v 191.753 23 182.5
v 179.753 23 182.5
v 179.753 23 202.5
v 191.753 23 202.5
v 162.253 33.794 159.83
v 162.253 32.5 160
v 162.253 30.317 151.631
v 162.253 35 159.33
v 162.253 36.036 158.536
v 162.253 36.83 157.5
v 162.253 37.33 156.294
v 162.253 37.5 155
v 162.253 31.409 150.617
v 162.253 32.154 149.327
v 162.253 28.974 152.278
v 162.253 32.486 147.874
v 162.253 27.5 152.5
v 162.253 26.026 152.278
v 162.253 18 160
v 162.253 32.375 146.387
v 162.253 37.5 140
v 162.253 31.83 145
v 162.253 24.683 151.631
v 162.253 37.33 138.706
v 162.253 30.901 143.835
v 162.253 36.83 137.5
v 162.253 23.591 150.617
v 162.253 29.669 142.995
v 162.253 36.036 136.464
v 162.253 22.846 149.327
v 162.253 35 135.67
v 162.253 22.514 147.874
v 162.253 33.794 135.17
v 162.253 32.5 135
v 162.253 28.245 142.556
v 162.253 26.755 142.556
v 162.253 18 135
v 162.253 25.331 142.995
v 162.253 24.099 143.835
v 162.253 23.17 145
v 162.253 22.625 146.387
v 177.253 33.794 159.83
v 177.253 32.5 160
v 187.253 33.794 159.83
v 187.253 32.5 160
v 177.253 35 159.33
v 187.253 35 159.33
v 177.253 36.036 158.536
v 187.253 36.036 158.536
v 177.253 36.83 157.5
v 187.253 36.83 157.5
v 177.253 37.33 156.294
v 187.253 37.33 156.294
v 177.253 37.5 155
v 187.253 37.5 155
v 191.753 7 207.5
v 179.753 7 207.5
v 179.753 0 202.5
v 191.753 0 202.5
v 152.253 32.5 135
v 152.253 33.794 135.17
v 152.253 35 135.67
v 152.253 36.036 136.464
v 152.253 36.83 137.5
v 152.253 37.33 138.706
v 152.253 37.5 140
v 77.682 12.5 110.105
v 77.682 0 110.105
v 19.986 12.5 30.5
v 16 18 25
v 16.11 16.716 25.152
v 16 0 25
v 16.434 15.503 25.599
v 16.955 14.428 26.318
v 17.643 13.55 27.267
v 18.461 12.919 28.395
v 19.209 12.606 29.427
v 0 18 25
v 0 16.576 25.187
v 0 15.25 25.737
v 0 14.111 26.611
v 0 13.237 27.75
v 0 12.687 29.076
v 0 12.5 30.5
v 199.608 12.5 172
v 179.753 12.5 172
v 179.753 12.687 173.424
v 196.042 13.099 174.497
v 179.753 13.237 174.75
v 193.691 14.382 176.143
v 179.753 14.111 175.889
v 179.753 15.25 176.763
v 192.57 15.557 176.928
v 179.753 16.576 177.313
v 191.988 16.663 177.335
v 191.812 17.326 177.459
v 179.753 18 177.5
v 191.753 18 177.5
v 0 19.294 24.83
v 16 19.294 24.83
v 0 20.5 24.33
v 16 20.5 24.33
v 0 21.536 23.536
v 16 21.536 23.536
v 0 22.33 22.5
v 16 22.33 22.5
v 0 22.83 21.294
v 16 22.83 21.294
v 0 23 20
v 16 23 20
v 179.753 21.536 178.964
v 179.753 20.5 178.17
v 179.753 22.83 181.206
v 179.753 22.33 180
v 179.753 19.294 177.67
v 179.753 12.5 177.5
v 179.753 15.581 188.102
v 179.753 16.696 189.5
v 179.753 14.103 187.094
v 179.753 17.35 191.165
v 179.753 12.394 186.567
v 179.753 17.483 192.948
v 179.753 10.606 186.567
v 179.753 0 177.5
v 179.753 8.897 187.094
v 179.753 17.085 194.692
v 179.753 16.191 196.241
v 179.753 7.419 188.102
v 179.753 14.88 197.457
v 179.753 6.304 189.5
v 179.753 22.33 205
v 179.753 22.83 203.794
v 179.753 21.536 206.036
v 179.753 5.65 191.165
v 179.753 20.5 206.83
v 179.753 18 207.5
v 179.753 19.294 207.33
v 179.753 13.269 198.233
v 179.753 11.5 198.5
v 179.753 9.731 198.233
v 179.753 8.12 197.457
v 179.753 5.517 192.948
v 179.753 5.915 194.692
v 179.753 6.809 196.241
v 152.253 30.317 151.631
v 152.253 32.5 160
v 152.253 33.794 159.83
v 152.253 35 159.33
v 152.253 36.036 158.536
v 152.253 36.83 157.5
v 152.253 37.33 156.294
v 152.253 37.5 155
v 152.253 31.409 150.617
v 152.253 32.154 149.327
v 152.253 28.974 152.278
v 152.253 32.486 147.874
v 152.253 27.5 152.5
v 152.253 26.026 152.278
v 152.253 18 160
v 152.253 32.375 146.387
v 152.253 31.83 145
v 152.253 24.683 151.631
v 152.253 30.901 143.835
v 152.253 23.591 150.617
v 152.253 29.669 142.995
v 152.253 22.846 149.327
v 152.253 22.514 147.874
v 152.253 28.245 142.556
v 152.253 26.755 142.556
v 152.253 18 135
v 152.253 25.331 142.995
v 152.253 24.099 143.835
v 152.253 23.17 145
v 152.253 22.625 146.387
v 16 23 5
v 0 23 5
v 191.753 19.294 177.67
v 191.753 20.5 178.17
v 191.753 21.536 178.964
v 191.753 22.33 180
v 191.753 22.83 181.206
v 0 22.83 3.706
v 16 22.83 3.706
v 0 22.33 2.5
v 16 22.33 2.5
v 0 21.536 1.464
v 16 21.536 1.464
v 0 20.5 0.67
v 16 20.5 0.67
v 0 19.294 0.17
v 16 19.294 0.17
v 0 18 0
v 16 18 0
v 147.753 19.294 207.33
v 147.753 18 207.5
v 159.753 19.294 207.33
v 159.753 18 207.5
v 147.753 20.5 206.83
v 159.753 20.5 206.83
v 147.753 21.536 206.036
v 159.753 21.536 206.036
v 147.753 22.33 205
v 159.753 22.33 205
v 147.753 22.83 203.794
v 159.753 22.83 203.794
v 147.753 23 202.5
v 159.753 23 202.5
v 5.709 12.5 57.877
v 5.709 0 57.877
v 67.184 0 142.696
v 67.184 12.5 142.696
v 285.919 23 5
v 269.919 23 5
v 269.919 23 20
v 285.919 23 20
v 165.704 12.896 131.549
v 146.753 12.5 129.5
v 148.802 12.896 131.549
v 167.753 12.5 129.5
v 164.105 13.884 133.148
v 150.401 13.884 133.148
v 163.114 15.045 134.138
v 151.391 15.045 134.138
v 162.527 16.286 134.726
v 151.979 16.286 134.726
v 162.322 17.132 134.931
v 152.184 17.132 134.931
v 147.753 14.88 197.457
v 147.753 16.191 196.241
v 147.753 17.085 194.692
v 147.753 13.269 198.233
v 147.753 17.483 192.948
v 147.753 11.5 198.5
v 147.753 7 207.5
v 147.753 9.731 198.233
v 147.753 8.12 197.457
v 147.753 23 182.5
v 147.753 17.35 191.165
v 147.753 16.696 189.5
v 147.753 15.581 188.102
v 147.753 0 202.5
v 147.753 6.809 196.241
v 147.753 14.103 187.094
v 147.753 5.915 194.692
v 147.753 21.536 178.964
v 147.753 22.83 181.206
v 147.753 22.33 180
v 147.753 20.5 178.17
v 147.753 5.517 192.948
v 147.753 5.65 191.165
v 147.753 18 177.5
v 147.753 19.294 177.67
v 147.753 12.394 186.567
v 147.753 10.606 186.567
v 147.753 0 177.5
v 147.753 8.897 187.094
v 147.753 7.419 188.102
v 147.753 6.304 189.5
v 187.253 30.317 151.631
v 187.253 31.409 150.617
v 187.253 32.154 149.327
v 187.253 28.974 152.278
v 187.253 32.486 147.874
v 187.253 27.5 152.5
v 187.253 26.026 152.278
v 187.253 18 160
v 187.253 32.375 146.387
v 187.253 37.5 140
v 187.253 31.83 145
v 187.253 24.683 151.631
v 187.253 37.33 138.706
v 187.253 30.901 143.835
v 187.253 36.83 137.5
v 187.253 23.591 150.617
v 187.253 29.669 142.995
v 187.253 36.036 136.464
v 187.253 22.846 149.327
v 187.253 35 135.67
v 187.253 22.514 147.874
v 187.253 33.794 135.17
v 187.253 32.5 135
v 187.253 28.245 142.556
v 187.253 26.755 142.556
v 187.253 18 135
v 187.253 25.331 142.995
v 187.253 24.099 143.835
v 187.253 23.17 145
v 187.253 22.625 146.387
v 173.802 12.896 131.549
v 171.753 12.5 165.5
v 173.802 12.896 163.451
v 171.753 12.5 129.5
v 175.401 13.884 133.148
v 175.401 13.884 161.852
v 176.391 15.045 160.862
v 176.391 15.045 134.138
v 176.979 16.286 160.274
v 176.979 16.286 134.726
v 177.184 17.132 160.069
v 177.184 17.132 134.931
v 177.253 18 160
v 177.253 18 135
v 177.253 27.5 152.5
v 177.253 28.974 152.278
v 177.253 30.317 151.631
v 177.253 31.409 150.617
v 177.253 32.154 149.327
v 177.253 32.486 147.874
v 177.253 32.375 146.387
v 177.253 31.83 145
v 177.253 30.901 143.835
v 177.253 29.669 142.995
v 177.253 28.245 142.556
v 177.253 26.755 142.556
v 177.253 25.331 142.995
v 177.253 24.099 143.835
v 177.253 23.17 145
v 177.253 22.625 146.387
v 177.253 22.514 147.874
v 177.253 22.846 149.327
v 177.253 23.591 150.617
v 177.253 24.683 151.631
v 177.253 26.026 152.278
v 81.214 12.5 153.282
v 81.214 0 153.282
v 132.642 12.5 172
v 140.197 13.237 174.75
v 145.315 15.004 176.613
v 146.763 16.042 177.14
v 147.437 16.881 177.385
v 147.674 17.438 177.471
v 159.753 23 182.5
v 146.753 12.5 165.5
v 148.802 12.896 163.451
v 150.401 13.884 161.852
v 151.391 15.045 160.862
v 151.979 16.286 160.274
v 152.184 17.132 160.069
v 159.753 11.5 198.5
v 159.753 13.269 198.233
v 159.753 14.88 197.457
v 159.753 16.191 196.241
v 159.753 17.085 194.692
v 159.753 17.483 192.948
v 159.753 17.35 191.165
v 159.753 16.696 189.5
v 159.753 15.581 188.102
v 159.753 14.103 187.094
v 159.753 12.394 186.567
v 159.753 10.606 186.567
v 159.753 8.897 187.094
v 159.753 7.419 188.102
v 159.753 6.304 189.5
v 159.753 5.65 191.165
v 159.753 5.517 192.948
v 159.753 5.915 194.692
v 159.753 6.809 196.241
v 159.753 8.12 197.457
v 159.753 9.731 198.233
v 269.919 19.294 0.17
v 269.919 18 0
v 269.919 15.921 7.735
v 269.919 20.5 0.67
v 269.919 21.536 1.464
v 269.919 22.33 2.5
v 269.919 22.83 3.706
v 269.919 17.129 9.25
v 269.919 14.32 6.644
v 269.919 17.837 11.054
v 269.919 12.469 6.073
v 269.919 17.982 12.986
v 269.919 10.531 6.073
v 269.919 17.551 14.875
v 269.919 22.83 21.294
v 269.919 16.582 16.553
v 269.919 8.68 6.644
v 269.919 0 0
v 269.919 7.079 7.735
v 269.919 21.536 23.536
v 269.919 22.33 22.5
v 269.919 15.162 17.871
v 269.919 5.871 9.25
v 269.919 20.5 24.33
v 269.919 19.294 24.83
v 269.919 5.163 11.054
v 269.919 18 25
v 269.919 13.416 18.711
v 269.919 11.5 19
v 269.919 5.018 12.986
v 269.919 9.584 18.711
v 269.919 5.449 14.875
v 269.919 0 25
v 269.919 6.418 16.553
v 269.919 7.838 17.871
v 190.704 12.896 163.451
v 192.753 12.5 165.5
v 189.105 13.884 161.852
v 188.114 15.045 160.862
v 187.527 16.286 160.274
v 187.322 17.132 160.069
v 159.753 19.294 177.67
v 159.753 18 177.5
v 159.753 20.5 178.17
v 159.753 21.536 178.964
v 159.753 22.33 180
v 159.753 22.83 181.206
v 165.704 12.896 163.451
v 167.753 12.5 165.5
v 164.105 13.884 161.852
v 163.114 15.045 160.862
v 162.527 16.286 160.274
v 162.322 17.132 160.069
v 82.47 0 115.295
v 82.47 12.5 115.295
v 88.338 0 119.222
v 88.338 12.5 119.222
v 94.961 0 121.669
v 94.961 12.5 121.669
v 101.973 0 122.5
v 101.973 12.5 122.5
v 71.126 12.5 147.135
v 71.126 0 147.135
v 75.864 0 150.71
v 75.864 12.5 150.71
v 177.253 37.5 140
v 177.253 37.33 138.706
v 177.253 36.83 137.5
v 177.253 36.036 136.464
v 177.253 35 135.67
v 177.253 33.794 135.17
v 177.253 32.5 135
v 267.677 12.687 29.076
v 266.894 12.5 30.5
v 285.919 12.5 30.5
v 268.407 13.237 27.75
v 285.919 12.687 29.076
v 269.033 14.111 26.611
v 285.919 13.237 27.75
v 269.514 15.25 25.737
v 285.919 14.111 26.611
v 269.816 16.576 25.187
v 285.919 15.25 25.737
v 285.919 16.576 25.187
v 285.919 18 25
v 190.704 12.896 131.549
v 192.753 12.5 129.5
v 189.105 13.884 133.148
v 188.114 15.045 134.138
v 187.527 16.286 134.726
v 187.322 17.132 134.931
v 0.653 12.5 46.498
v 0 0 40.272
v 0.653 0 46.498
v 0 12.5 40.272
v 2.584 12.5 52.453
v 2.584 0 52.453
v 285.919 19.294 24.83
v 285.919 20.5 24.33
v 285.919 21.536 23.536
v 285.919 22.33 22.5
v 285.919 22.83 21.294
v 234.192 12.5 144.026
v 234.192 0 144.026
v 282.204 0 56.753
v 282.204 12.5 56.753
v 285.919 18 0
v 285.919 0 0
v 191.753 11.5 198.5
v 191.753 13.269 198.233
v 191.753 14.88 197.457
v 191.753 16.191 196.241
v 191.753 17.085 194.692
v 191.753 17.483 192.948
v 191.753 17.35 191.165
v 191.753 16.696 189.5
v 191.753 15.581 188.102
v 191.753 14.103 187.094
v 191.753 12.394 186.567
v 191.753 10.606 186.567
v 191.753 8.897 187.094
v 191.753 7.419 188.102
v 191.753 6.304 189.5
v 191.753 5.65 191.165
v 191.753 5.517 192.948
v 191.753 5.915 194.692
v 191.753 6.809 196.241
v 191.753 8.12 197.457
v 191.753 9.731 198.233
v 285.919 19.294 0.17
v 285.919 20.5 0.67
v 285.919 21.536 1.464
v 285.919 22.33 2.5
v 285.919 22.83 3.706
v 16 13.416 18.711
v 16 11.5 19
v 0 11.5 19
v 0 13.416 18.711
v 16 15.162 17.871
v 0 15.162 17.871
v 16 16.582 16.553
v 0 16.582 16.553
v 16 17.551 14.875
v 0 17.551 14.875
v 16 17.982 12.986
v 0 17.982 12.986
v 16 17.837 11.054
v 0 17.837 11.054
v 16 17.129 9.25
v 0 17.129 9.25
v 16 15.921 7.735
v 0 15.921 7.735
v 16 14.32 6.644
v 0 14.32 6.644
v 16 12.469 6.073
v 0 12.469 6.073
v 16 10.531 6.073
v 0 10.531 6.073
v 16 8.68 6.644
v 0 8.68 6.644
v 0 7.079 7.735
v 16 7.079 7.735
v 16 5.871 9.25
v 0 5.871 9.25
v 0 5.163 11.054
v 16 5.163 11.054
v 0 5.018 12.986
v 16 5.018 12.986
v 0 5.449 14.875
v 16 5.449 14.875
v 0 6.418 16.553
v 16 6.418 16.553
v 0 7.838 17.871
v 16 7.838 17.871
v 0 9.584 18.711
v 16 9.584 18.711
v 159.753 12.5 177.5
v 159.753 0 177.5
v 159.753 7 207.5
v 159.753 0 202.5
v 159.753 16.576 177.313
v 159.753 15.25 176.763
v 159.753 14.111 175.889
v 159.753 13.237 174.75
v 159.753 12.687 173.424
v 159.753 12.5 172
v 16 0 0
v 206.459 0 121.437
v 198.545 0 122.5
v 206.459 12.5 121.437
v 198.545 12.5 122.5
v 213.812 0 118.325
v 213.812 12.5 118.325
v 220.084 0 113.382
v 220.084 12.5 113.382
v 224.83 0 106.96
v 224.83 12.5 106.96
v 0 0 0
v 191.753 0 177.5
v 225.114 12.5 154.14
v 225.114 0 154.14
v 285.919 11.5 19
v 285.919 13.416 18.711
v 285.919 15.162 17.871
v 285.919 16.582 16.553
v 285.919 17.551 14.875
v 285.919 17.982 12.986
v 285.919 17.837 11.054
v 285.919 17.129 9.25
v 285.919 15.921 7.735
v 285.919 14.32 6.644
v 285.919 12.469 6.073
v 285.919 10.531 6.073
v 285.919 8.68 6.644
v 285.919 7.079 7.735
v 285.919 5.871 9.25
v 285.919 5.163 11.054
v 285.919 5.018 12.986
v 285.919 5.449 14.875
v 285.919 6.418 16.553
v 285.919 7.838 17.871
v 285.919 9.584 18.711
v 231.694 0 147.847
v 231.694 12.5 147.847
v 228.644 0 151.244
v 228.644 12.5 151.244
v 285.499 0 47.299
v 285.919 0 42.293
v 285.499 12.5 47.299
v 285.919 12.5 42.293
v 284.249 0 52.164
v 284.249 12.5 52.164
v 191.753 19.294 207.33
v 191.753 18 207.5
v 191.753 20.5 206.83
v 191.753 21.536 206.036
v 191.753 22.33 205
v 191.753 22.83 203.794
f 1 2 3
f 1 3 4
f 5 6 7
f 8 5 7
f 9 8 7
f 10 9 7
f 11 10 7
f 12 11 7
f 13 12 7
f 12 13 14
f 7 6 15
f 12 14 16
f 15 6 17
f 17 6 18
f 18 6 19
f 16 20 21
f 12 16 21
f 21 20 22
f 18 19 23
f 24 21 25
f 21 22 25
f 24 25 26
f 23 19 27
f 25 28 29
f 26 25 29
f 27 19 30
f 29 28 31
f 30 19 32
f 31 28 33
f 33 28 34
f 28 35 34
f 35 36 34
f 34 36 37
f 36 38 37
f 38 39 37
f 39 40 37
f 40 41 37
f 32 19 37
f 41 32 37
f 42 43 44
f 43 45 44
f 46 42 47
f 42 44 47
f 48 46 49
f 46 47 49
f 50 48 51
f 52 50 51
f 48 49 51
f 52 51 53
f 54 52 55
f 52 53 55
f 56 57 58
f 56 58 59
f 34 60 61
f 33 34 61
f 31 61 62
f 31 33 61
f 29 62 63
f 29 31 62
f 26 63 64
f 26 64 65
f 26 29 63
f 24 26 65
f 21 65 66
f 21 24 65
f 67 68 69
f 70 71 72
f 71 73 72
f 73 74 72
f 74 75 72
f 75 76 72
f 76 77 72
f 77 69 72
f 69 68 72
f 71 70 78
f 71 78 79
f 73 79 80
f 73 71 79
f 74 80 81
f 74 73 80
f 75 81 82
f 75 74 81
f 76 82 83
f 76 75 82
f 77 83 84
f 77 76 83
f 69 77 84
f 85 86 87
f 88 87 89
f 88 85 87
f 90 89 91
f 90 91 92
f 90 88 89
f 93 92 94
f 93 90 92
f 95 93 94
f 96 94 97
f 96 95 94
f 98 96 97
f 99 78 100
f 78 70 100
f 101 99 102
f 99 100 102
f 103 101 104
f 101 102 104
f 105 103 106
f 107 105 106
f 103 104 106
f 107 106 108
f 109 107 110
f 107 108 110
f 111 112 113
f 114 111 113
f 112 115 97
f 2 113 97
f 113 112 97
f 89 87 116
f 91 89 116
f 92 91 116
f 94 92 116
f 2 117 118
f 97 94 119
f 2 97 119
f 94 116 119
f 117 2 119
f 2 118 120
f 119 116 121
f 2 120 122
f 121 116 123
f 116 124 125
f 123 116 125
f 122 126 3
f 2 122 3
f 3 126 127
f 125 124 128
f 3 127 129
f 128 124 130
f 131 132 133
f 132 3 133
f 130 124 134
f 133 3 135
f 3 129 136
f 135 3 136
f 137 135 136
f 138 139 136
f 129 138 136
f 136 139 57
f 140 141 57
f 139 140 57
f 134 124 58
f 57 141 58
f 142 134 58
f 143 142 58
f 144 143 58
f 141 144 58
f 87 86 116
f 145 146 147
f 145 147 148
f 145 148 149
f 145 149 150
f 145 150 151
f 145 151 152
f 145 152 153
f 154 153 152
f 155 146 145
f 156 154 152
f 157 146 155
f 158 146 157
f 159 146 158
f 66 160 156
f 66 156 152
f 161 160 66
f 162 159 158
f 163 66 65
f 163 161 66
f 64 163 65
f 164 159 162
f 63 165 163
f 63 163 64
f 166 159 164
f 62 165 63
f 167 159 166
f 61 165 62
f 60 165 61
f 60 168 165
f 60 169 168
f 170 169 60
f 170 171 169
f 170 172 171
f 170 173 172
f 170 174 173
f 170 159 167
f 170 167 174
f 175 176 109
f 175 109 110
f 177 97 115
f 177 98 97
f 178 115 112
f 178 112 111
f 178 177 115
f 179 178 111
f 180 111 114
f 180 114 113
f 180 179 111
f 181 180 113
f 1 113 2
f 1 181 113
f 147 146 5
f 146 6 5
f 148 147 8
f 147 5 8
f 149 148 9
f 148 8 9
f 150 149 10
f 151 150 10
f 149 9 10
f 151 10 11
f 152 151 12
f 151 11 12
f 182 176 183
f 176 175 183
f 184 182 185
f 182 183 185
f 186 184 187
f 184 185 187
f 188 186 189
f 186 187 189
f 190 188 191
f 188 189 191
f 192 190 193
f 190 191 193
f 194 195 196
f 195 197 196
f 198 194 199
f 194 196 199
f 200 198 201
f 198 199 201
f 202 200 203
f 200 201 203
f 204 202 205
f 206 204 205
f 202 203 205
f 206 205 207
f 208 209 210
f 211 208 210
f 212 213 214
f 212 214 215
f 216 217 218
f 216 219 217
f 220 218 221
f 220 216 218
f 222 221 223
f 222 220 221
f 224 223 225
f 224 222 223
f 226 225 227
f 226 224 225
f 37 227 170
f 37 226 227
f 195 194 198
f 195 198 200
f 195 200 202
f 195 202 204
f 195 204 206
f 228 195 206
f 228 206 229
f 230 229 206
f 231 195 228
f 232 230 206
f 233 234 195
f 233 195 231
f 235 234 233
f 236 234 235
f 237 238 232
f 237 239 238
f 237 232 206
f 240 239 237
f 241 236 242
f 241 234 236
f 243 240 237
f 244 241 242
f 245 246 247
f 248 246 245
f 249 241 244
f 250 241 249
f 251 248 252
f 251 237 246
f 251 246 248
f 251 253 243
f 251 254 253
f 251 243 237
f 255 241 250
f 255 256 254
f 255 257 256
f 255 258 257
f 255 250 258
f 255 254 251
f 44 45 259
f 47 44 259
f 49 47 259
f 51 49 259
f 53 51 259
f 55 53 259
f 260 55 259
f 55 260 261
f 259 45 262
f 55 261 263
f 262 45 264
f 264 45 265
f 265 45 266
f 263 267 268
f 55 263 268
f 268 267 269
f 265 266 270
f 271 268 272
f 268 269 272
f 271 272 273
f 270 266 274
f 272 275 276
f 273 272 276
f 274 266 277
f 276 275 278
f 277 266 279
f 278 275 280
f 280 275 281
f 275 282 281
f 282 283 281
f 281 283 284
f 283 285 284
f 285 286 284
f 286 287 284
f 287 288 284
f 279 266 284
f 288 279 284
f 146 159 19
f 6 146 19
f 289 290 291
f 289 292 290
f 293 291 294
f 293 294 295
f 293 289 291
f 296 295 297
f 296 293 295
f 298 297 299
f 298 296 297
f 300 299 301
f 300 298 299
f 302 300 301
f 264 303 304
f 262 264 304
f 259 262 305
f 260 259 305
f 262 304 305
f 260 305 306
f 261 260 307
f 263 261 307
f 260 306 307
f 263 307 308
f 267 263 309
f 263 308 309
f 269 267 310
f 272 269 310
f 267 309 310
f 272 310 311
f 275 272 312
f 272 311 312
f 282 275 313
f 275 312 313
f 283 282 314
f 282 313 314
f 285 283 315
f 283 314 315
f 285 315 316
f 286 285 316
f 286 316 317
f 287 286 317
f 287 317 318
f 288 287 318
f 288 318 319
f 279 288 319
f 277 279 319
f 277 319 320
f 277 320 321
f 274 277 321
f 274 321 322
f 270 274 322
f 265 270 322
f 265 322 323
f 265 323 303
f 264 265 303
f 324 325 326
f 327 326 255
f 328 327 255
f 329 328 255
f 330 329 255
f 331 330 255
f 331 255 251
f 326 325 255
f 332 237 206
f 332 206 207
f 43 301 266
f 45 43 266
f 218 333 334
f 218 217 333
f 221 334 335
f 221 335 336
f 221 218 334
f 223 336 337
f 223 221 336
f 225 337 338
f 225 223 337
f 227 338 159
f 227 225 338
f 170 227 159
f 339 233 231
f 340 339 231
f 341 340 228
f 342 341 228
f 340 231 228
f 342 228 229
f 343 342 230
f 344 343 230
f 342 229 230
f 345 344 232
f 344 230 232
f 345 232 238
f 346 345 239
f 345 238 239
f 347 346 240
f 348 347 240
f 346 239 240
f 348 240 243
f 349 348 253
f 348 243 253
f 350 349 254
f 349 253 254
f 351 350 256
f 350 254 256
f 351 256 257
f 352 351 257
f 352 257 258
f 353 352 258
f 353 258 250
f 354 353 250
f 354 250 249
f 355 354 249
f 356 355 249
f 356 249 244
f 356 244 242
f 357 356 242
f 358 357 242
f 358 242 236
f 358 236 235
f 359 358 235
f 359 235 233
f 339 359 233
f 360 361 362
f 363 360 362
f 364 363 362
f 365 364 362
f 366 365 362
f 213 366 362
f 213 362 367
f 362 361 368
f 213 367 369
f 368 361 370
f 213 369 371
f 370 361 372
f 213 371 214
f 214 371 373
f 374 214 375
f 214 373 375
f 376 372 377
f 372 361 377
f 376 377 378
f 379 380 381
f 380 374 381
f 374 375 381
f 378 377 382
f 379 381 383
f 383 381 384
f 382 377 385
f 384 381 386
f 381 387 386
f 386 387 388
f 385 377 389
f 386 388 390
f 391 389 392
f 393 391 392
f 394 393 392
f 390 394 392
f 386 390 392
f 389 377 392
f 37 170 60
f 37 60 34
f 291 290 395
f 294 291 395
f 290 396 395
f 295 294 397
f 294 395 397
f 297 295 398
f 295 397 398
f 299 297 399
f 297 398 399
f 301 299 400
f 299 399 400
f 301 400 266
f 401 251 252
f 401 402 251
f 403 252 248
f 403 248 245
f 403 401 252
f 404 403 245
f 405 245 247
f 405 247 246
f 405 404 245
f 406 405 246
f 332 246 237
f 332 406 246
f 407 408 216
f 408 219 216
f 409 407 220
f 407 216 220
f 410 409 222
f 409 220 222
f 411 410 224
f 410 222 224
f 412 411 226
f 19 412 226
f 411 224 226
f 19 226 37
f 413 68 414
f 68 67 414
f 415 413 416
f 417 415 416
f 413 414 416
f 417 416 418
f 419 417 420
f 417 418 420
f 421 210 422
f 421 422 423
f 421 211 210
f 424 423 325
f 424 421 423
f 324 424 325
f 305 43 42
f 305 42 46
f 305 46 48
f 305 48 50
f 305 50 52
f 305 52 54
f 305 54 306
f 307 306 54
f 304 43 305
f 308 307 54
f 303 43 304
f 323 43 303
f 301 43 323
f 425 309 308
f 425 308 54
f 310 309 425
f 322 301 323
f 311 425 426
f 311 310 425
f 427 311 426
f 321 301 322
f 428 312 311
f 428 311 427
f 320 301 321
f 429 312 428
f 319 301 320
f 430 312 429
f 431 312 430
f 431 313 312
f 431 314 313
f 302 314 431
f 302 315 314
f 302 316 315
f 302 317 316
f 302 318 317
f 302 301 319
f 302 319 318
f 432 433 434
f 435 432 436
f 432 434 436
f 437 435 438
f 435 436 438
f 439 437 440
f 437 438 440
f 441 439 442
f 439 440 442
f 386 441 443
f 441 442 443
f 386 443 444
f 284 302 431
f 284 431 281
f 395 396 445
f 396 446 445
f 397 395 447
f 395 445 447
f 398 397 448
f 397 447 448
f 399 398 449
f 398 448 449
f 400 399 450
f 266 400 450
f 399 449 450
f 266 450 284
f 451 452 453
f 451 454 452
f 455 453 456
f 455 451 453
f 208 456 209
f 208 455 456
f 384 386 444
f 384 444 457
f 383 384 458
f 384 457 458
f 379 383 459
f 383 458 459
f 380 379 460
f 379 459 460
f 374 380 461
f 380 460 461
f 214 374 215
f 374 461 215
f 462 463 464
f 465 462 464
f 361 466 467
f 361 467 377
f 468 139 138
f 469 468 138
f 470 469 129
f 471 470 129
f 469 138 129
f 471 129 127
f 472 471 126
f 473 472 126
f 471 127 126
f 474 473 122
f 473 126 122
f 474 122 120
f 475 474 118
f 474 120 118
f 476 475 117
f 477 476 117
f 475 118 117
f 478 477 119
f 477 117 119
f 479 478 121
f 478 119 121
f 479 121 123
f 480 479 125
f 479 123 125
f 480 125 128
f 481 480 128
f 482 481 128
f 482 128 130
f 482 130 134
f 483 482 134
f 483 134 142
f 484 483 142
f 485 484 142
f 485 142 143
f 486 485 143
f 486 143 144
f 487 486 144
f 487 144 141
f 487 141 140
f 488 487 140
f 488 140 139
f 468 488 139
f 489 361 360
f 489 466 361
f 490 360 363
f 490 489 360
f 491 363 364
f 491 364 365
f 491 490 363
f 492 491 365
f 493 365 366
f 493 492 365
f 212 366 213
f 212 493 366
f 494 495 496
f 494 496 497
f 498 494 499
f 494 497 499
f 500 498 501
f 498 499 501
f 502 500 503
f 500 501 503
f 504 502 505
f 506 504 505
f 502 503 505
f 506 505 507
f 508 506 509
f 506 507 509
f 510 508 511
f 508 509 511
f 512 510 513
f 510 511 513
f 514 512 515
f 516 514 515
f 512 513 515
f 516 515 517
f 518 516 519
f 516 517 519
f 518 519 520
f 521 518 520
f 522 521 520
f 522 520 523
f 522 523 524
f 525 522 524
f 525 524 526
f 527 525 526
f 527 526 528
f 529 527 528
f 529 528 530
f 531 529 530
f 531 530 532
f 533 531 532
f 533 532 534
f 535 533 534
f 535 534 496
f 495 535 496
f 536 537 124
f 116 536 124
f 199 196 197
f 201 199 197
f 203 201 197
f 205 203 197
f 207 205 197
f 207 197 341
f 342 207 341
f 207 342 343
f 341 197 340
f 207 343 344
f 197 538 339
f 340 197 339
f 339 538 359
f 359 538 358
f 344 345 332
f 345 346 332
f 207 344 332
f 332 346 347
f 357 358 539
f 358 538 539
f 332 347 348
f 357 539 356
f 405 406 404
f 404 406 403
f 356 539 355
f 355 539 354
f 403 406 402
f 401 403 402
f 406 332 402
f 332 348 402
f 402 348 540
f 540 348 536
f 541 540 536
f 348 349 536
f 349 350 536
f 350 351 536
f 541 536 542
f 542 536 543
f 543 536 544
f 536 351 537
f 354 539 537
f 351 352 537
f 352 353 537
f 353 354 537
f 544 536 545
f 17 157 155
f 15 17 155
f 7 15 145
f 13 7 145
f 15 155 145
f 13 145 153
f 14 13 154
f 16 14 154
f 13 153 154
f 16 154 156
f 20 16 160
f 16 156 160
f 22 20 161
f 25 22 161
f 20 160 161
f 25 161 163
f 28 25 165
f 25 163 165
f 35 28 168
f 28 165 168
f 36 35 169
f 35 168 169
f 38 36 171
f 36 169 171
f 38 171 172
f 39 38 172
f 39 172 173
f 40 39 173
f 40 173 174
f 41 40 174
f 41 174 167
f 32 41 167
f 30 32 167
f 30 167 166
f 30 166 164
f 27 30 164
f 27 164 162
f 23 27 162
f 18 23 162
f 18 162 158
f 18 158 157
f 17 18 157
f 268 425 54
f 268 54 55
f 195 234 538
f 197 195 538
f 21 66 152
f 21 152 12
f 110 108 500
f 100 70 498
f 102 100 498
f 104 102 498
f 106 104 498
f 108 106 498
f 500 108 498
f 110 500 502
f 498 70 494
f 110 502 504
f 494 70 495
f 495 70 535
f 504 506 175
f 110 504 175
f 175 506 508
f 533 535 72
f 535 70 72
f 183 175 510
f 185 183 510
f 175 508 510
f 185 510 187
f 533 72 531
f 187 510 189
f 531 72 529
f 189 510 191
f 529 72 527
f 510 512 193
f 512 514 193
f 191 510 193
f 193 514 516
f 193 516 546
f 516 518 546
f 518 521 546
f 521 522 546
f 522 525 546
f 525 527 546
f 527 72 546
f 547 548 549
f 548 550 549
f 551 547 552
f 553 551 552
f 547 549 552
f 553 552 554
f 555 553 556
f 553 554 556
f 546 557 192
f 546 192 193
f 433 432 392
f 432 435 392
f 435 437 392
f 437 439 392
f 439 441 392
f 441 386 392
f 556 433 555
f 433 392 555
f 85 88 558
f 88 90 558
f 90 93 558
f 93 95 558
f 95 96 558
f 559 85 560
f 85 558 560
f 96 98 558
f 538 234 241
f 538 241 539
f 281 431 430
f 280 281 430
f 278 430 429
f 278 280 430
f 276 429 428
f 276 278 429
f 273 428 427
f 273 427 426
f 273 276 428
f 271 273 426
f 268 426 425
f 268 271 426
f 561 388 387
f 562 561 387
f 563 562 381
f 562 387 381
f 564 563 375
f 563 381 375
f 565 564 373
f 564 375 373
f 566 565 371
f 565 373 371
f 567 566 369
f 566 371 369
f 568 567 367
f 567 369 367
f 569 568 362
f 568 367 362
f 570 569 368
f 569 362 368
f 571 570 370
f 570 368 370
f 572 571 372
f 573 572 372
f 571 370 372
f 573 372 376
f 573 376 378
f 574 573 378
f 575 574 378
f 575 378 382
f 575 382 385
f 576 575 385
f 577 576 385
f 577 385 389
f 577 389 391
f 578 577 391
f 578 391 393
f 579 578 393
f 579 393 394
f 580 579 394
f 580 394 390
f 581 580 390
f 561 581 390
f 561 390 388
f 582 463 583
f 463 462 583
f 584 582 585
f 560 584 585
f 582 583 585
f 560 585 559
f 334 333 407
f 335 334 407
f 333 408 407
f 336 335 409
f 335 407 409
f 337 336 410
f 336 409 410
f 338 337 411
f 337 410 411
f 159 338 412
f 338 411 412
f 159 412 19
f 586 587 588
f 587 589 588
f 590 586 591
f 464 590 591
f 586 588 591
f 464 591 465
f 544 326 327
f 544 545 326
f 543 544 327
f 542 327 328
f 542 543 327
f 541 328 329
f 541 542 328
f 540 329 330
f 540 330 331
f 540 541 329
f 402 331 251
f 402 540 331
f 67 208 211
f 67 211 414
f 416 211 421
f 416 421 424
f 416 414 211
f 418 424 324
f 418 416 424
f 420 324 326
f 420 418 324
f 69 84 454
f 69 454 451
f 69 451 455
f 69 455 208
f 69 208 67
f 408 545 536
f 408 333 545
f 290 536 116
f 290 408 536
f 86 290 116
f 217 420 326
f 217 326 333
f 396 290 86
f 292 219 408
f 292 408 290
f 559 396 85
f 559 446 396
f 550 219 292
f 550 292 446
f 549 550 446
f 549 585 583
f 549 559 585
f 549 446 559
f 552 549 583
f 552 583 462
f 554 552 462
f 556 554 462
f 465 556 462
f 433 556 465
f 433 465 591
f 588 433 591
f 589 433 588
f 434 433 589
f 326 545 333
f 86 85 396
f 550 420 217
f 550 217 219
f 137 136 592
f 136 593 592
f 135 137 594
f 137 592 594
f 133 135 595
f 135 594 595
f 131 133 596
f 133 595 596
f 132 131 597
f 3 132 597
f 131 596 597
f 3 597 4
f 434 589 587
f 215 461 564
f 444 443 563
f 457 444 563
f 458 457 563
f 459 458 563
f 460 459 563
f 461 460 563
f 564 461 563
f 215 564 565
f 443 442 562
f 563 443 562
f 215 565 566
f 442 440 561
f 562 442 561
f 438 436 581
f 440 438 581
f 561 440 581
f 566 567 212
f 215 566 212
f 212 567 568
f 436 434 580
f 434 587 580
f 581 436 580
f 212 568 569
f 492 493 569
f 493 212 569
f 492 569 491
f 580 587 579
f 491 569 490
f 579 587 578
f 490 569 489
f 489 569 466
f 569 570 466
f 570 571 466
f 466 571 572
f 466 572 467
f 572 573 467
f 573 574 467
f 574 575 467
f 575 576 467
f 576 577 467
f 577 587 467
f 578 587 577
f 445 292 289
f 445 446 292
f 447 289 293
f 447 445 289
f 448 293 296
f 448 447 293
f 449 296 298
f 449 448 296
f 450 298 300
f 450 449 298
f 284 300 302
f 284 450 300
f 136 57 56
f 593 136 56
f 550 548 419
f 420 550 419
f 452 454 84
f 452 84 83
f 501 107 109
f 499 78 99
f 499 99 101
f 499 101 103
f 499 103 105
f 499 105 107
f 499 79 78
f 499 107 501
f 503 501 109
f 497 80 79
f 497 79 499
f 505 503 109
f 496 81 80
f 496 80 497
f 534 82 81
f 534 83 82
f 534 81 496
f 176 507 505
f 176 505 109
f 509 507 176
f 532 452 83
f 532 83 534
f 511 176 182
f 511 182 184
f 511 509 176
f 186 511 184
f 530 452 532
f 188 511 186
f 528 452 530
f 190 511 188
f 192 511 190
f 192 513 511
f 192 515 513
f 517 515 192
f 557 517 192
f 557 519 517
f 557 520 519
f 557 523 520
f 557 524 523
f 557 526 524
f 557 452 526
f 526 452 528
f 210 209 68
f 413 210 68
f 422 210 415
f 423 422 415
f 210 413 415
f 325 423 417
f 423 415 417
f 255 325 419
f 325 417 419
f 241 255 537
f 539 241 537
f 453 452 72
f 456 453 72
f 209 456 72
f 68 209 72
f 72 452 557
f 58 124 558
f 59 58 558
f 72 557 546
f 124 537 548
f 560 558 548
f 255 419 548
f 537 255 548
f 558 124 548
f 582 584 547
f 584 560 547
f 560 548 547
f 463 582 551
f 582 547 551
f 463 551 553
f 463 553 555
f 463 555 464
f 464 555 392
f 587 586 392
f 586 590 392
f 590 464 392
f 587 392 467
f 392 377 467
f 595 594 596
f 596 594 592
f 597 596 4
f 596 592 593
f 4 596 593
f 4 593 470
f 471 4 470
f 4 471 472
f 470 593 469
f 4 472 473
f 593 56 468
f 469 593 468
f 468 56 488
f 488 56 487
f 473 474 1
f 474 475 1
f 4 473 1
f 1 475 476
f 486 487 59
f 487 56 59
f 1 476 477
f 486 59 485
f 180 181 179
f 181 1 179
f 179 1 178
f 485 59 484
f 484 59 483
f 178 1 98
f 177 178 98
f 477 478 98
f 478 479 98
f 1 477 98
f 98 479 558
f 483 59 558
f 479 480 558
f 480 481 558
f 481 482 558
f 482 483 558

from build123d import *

# Parameters (mm, degrees)
BOSS_EXTRUDE1_DEPTH = 12.5
SKETCH5_W           = 10
SKETCH5_H           = 25
BOSS_EXTRUDE2_DEPTH = 25
SKETCH7_W           = 12
SKETCH7_H           = 30
BOSS_EXTRUDE4_DEPTH = 10.5
SKETCH8_R           = 6
CUT_EXTRUDE1_DEPTH  = 258.475083954
SKETCH11_W          = 16
SKETCH11_H          = 25
BOSS_EXTRUDE6_DEPTH = 10.5
SKETCH12_R          = 6.5
CUT_EXTRUDE3_DEPTH  = 356.26387941
SKETCH13_R          = 5
CUT_EXTRUDE4_DEPTH  = 261.08353454
FILLET2_R           = 30
FILLET3_R           = 5
FILLET4_R           = 5.5
CHAMFER1_SIZE       = 5
CHAMFER1_SIZE2      = 7


with BuildPart() as part:
    # Sketch2 → Boss-Extrude1 (new body)
    with BuildSketch(Plane(origin=(0, 0, 0), x_dir=(1, 0, 0), z_dir=(0, 1, 0))):
        Polygon((72.577488302, -150.138388534), (147.752897965, -177.5), (147.752897965, -207.5), (159.752897965, -207.5), (159.752897965, -177.5), (169.752897965, -177.5), (179.752897965, -177.5), (179.752897965, -207.5), (191.752897965, -207.5), (191.752897965, -177.5), (230.829328841, -150.138388534), (285.919436229, -50), (285.919436229, 0), (269.919436229, 0), (269.919436229, -25), (216.280811233, -122.5), (86.665258479, -122.5), (16, -25), (16, 0), (0, 0), (0, -50), align=None)
    extrude(amount=BOSS_EXTRUDE1_DEPTH)

    # Sketch5 → Boss-Extrude2 (add)
    with BuildSketch(Plane(origin=(0, 12.5, 0), x_dir=(1, 0, 0), z_dir=(0, 1, 0))):
        with Locations((157.252897965, -147.5)):
            Rectangle(SKETCH5_W, SKETCH5_H)
        with Locations((182.252897965, -147.5)):
            Rectangle(SKETCH5_W, SKETCH5_H)
    extrude(amount=BOSS_EXTRUDE2_DEPTH)

    # Sketch7 → Boss-Extrude4 (add)
    with BuildSketch(Plane(origin=(0, 12.5, 0), x_dir=(1, 0, 0), z_dir=(0, 1, 0))):
        with Locations((153.752897965, -192.5)):
            Rectangle(SKETCH7_W, SKETCH7_H)
        with Locations((185.752897965, -192.5)):
            Rectangle(SKETCH7_W, SKETCH7_H)
    extrude(amount=BOSS_EXTRUDE4_DEPTH)

    # Sketch8 → Cut-Extrude1 (cut, through all)
    with BuildSketch(Plane.ZY.offset(-147.752897965)):
        with Locations((192.5, 11.5)):
            Circle(SKETCH8_R)
    extrude(amount=-CUT_EXTRUDE1_DEPTH, mode=Mode.SUBTRACT)

    # Sketch11 → Boss-Extrude6 (add)
    with BuildSketch(Plane(origin=(0, 12.5, 0), x_dir=(1, 0, 0), z_dir=(0, 1, 0))):
        with Locations((8, -12.5)):
            Rectangle(SKETCH11_W, SKETCH11_H)
        with Locations((277.919436229, -12.5)):
            Rectangle(SKETCH11_W, SKETCH11_H)
    extrude(amount=BOSS_EXTRUDE6_DEPTH)

    # Sketch12 → Cut-Extrude3 (cut, through all)
    with BuildSketch(Plane.ZY):
        with Locations((12.5, 11.5)):
            Circle(SKETCH12_R)
    extrude(amount=-CUT_EXTRUDE3_DEPTH, mode=Mode.SUBTRACT)

    # Sketch13 → Cut-Extrude4 (cut, through all)
    with BuildSketch(Plane.ZY.offset(-152.252897965)):
        with Locations((147.5, 27.5)):
            Circle(SKETCH13_R)
    extrude(amount=-CUT_EXTRUDE4_DEPTH, mode=Mode.SUBTRACT)

    # Fillet2
    fillet2_edges = [part.edges().sort_by_distance(p)[0] for p in [
        (0, 6.25, 50),
        (86.665258479, 6.25, 122.5),
        (216.280811233, 6.25, 122.5),
        (285.919436229, 6.25, 50),
        (230.829328841, 6.25, 150.138388534),
        (72.577488302, 6.25, 150.138388534),
    ]]
    fillet(fillet2_edges, radius=FILLET2_R)

    # Fillet3
    fillet3_edges = [part.edges().sort_by_distance(p)[0] for p in [
        (185.752897965, 23, 207.5),
        (185.752897965, 23, 177.5),
        (8, 23, 25),
        (8, 23, 0),
        (277.919436229, 23, 25),
        (277.919436229, 23, 0),
        (157.252897965, 37.5, 160),
        (157.252897965, 37.5, 135),
        (182.252897965, 37.5, 160),
        (182.252897965, 37.5, 135),
        (153.752897965, 23, 207.5),
        (153.752897965, 23, 177.5),
    ]]
    fillet(fillet3_edges, radius=FILLET3_R)

    # Fillet4
    fillet4_edges = [part.edges().sort_by_distance(p)[0] for p in [
        (153.752897965, 12.5, 177.5),
        (185.752897965, 12.5, 177.5),
        (182.252897965, 12.5, 135),
        (157.252897965, 12.5, 135),
        (182.252897965, 12.5, 160),
        (157.252897965, 12.5, 160),
        (8, 12.5, 25),
        (277.919436229, 12.5, 25),
        (152.252897965, 12.5, 147.5),
        (187.252897965, 12.5, 147.5),
        (177.252897965, 12.5, 147.5),
        (162.252897965, 12.5, 147.5),
    ]]
    fillet(fillet4_edges, radius=FILLET4_R - 0.0001)  # a hair under: the kernel refuses the full size

    # Chamfer1
    chamfer1_edges = [part.edges().sort_by_distance(p)[0] for p in [
        (185.752897965, 0, 207.5),
        (153.752897965, 0, 207.5),
    ]]
    chamfer1_side = [part.faces().sort_by_distance(p)[0] for p in [
        (115.691812184, 0, 162.071200665),
    ]]
    chamfer(chamfer1_edges, length=CHAMFER1_SIZE, length2=CHAMFER1_SIZE2, reference=chamfer1_side[0])


solid = part.part
